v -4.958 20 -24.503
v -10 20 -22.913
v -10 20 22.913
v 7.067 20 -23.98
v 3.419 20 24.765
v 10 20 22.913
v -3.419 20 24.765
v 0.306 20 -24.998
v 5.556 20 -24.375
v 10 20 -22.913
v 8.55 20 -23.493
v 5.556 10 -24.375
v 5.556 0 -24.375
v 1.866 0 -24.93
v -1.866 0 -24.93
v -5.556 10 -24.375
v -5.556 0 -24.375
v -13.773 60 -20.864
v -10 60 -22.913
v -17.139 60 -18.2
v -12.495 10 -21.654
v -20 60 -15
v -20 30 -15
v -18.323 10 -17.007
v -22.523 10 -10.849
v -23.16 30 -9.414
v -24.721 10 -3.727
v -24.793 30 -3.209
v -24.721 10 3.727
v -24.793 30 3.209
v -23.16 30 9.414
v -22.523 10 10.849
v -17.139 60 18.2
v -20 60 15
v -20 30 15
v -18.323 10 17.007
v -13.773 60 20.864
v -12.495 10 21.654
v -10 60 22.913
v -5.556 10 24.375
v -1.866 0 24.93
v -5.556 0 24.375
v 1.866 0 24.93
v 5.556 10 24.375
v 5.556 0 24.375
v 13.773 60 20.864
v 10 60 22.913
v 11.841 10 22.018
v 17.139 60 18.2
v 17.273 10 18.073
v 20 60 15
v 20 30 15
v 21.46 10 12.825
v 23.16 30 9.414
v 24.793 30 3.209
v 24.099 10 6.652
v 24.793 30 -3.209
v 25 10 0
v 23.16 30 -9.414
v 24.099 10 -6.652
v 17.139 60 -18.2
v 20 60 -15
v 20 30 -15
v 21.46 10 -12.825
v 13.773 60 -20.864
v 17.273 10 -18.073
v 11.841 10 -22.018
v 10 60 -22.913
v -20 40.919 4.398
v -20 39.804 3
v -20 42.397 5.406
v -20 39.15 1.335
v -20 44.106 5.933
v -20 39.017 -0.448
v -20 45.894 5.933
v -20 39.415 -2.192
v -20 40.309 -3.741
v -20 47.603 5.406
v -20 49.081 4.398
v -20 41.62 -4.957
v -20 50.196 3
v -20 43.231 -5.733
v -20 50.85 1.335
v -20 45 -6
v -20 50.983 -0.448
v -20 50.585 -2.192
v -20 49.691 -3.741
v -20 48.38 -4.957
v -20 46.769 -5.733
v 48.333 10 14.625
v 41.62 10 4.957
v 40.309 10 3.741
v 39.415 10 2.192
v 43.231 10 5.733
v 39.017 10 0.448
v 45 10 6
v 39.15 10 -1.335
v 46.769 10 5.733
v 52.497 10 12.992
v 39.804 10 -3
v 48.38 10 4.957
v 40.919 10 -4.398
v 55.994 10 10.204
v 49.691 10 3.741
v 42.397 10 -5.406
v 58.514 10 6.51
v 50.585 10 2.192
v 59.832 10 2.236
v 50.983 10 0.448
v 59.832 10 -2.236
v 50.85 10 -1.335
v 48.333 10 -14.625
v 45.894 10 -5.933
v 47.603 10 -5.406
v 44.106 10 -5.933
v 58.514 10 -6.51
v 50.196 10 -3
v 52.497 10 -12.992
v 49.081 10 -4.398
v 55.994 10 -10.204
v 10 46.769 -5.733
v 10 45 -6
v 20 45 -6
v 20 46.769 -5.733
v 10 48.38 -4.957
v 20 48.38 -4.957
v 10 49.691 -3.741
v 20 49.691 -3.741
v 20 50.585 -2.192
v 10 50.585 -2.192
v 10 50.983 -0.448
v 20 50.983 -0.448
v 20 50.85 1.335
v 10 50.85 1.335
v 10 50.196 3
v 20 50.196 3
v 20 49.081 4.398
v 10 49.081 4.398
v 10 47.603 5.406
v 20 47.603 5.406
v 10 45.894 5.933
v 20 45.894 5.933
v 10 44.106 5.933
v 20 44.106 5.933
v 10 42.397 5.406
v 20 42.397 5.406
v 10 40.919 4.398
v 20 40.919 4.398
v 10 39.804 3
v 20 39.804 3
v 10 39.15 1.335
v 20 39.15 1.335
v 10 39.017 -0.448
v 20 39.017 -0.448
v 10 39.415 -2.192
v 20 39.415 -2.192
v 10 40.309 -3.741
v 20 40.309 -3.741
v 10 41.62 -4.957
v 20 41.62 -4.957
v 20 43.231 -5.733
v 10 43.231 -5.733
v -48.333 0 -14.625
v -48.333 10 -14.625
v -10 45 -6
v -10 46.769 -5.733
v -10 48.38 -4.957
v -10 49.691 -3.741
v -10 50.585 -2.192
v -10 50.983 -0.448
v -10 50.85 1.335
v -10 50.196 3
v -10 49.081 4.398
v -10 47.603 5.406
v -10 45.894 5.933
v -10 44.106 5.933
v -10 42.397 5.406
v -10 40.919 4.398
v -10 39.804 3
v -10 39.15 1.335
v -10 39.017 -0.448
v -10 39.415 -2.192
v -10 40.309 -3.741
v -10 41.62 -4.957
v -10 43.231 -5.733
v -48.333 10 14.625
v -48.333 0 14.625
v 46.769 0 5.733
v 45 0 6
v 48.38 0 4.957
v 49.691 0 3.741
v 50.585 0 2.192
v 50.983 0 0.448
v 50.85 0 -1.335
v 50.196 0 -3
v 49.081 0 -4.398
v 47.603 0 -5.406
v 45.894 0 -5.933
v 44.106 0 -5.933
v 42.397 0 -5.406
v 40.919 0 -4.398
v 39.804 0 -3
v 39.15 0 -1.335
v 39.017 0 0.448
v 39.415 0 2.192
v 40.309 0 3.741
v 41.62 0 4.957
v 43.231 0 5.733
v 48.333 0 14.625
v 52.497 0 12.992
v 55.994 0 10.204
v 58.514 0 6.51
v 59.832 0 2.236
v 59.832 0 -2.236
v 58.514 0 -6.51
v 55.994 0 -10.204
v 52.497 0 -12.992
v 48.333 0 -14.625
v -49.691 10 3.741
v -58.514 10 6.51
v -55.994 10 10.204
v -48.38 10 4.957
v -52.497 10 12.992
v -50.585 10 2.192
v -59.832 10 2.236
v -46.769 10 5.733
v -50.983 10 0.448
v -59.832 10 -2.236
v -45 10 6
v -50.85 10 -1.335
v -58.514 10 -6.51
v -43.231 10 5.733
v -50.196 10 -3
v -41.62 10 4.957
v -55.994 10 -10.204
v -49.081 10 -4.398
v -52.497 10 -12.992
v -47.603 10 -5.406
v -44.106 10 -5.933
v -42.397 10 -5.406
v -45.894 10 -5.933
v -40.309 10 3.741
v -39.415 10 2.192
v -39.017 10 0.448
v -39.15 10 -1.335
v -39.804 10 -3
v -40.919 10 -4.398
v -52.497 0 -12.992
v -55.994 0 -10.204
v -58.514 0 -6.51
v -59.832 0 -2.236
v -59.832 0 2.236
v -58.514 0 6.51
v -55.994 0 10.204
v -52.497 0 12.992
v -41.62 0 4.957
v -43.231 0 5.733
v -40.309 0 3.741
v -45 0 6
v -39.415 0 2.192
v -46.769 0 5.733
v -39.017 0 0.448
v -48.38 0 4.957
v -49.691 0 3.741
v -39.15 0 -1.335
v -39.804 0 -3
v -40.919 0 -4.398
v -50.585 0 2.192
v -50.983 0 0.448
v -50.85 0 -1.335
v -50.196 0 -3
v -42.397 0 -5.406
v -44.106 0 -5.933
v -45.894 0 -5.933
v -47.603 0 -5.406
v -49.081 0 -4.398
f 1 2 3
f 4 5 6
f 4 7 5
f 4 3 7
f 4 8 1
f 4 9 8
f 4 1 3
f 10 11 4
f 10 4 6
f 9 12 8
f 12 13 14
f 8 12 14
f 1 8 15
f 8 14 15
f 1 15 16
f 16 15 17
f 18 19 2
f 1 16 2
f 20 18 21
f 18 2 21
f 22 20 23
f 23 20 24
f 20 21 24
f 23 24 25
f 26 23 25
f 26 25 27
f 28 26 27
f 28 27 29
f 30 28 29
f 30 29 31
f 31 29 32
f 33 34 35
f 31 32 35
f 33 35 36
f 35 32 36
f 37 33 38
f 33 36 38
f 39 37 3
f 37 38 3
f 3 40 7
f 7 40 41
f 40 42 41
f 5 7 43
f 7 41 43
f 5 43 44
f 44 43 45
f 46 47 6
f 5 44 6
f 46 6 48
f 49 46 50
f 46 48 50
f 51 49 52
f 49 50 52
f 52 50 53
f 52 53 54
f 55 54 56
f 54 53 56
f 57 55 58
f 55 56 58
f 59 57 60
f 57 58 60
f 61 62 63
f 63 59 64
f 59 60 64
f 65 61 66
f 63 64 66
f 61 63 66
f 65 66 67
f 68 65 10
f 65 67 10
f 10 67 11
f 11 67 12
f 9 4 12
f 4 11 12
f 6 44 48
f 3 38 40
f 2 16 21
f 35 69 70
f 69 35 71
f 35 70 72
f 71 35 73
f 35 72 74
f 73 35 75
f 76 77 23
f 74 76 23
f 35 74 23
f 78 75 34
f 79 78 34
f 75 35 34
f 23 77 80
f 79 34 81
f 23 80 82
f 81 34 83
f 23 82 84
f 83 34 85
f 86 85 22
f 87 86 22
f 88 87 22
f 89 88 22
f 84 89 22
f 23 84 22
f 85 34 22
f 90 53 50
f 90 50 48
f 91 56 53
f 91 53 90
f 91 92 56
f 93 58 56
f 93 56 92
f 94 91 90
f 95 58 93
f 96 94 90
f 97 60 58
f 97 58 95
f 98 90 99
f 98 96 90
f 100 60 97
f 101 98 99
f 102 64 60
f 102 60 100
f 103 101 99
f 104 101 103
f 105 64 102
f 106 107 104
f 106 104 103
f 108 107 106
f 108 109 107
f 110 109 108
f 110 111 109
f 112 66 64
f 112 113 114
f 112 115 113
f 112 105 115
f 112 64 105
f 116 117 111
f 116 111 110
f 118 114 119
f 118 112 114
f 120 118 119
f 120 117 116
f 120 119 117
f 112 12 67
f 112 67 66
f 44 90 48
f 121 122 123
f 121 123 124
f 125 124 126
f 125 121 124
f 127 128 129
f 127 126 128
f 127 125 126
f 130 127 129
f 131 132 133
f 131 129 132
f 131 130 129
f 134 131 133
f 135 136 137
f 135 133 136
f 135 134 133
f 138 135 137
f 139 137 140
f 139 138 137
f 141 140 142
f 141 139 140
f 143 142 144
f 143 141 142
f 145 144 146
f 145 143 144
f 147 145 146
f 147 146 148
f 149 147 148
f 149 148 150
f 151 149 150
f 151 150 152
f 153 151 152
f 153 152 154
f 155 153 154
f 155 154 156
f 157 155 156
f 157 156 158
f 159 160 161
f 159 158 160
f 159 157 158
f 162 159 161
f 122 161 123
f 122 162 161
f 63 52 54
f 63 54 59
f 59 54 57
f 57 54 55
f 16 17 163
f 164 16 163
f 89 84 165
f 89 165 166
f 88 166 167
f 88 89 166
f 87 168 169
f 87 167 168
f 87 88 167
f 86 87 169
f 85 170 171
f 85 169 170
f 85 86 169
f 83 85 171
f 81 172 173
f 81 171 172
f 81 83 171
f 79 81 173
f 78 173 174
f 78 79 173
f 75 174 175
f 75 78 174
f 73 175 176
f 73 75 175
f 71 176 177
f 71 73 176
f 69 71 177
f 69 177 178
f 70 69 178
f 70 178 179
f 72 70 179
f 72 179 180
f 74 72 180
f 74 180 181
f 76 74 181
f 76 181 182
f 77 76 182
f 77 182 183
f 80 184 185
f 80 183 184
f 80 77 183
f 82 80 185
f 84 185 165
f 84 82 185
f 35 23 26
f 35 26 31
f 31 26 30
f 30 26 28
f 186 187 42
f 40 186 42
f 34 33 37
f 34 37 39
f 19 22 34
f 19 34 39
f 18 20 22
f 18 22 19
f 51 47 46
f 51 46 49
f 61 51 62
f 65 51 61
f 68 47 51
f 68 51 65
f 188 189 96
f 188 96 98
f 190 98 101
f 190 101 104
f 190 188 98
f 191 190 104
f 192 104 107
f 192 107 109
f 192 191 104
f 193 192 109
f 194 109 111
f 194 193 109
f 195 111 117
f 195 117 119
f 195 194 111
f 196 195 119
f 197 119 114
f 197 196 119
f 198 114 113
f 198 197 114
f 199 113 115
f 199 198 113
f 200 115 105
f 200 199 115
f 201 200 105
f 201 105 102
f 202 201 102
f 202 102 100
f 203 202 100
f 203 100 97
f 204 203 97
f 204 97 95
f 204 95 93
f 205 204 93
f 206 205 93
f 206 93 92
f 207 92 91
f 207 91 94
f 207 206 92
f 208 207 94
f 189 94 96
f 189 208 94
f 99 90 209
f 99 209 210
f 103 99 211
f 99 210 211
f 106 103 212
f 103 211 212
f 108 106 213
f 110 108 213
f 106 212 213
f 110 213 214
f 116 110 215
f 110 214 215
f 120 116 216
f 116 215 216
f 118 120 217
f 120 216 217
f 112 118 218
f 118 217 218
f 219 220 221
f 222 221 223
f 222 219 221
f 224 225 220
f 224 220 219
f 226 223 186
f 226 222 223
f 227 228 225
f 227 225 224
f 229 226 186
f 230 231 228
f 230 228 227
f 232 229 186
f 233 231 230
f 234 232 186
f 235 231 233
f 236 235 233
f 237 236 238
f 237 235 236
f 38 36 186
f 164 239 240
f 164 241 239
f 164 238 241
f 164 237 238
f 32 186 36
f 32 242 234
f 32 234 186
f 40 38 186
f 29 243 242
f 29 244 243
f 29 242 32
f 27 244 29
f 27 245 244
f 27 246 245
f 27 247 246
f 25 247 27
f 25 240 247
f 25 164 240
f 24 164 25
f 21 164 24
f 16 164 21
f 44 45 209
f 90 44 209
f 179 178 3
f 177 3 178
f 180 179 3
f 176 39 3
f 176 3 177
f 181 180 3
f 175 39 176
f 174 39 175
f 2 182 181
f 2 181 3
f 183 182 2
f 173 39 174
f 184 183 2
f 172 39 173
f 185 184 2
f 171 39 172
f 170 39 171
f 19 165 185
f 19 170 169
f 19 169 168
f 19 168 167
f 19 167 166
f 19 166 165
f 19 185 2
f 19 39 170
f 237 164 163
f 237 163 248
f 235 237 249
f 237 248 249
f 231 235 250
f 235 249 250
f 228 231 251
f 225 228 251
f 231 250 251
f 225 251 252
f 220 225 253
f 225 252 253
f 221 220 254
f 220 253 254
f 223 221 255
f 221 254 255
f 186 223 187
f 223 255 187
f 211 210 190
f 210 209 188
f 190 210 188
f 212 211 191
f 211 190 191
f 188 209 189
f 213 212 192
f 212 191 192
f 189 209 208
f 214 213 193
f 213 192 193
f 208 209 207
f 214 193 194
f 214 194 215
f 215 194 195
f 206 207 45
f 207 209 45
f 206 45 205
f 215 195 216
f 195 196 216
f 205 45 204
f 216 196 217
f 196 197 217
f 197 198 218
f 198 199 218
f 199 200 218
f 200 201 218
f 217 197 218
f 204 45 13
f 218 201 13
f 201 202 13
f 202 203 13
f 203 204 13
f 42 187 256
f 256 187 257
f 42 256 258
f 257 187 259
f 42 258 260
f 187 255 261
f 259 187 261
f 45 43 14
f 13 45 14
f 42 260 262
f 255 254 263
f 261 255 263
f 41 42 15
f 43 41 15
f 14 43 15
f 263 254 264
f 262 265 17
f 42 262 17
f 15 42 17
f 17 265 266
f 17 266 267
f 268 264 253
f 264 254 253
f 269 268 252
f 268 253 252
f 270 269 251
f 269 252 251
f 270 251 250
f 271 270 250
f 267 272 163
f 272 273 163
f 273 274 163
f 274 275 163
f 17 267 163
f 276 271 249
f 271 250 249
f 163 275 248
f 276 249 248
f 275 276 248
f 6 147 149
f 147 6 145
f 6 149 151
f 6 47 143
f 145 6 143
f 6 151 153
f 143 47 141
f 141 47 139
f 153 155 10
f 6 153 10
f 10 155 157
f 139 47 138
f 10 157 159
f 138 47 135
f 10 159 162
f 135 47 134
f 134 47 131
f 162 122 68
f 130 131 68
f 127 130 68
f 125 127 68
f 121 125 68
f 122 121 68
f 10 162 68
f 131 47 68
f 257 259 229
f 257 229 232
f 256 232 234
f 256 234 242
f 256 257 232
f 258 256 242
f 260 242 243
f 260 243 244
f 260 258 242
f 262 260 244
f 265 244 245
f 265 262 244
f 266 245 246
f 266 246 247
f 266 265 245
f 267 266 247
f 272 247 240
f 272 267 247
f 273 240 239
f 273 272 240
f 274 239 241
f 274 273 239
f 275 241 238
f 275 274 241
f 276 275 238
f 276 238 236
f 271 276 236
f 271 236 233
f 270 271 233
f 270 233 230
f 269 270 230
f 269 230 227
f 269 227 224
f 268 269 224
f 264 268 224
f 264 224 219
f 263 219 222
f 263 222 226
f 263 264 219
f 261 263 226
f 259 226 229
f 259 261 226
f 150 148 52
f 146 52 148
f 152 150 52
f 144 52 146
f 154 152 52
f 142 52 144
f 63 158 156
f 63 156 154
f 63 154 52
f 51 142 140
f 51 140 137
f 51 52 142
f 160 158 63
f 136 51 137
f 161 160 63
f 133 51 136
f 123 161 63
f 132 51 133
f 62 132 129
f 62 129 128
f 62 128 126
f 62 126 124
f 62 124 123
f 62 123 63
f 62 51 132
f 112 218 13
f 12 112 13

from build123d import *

# Parameters (mm, degrees)
CROQUIS1_R                 = 6
SALIENTE_EXTRUIR1_DEPTH    = 10
SALIENTE_EXTRUIR1_2_DEPTH  = 10
SALIENTE_EXTRUIR2_DEPTH    = 60
CROQUIS2_W                 = 20
CROQUIS2_H                 = 56.632535906
CORTAR_EXTRUIR2_DEPTH      = 40
CROQUIS3_W                 = 5
CROQUIS3_H                 = 50
CORTAR_EXTRUIR3_DEPTH      = 30
CORTAR_EXTRUIR4_DEPTH      = 104.07764064
CORTAR_EXTRUIR4_DEPTH_BACK = 104.07764064
CROQUIS5_R                 = 6


with BuildPart() as part:
    # Croquis1 → Saliente-Extruir1 (new body)
    with BuildSketch(Plane(origin=(0, 0, 0), x_dir=(1, 0, 0), z_dir=(0, 1, 0))):
        with BuildLine():
            Line((-5.555555556, 24.374901076), (-48.333333333, 14.624940646))
            ThreePointArc((-48.333333333, 14.624940646), (-60, 0), (-48.333333333, -14.624940646))
            Line((-48.333333333, -14.624940646), (-5.555555556, -24.374901076))
            ThreePointArc((-5.555555556, -24.374901076), (-25, 0), (-5.555555556, 24.374901076))
        make_face()
        with Locations((-45, 0)):
            Circle(CROQUIS1_R, mode=Mode.SUBTRACT)
    extrude(amount=SALIENTE_EXTRUIR1_DEPTH)



with BuildPart() as body_2:
    # Croquis1 → Saliente-Extruir1 2 (new body)
    with BuildSketch(Plane(origin=(0, 0, 0), x_dir=(1, 0, 0), z_dir=(0, 1, 0))):
        with BuildLine():
            Line((48.333333333, 14.624940646), (5.555555556, 24.374901076))
            ThreePointArc((5.555555556, 24.374901076), (25, 0), (5.555555556, -24.374901076))
            Line((5.555555556, -24.374901076), (48.333333333, -14.624940646))
            ThreePointArc((48.333333333, -14.624940646), (60, 0), (48.333333333, 14.624940646))
        make_face()
        with Locations((45, 0)):
            Circle(CROQUIS1_R, mode=Mode.SUBTRACT)
    extrude(amount=SALIENTE_EXTRUIR1_2_DEPTH)


with BuildPart() as part_1:
    add(part.part)

    add(body_2.part)  # Saliente-Extruir2 merges body 2
    # Croquis1<4> → Saliente-Extruir2 (add)
    with BuildSketch(Plane(origin=(0, 0, 0), x_dir=(1, 0, 0), z_dir=(0, 1, 0))):
        with BuildLine():
            ThreePointArc((5.555555556, 24.374901076), (0, 25), (-5.555555556, 24.374901076))
            ThreePointArc((-5.555555556, 24.374901076), (-25, 0), (-5.555555556, -24.374901076))
            ThreePointArc((-5.555555556, -24.374901076), (0, -25), (5.555555556, -24.374901076))
            ThreePointArc((5.555555556, -24.374901076), (19.543398999, -15.590239112), (25, 0))
            ThreePointArc((25, 0), (19.543398999, 15.590239112), (5.555555556, 24.374901076))
        make_face()
    extrude(amount=SALIENTE_EXTRUIR2_DEPTH)

    # Croquis2 → Cortar-Extruir2 (cut)
    with BuildSketch(Plane(origin=(0, 60, 0), x_dir=(1, 0, 0), z_dir=(0, 1, 0))):
        Rectangle(CROQUIS2_W, CROQUIS2_H)
    extrude(amount=-CORTAR_EXTRUIR2_DEPTH, mode=Mode.SUBTRACT)

    # Croquis3 → Cortar-Extruir3 (cut)
    with BuildSketch(Plane(origin=(0, 60, 0), x_dir=(1, 0, 0), z_dir=(0, 1, 0))):
        with Locations((-22.5, 0)):
            Rectangle(CROQUIS3_W, CROQUIS3_H)
        with Locations((22.5, 0)):
            Rectangle(CROQUIS3_W, CROQUIS3_H)
    extrude(amount=-CORTAR_EXTRUIR3_DEPTH, mode=Mode.SUBTRACT)

    # Croquis5 → Cortar-Extruir4 (cut, two sides: drawn at the far end of the back side and taken through both)
    with BuildSketch(Plane(origin=(20, 0, 0), x_dir=(0, 0, -1), z_dir=(1, 0, 0)).offset(-CORTAR_EXTRUIR4_DEPTH_BACK)):
        with Locations((0, 45)):
            Circle(CROQUIS5_R)
    extrude(amount=CORTAR_EXTRUIR4_DEPTH + CORTAR_EXTRUIR4_DEPTH_BACK, mode=Mode.SUBTRACT)


solid = part_1.part
